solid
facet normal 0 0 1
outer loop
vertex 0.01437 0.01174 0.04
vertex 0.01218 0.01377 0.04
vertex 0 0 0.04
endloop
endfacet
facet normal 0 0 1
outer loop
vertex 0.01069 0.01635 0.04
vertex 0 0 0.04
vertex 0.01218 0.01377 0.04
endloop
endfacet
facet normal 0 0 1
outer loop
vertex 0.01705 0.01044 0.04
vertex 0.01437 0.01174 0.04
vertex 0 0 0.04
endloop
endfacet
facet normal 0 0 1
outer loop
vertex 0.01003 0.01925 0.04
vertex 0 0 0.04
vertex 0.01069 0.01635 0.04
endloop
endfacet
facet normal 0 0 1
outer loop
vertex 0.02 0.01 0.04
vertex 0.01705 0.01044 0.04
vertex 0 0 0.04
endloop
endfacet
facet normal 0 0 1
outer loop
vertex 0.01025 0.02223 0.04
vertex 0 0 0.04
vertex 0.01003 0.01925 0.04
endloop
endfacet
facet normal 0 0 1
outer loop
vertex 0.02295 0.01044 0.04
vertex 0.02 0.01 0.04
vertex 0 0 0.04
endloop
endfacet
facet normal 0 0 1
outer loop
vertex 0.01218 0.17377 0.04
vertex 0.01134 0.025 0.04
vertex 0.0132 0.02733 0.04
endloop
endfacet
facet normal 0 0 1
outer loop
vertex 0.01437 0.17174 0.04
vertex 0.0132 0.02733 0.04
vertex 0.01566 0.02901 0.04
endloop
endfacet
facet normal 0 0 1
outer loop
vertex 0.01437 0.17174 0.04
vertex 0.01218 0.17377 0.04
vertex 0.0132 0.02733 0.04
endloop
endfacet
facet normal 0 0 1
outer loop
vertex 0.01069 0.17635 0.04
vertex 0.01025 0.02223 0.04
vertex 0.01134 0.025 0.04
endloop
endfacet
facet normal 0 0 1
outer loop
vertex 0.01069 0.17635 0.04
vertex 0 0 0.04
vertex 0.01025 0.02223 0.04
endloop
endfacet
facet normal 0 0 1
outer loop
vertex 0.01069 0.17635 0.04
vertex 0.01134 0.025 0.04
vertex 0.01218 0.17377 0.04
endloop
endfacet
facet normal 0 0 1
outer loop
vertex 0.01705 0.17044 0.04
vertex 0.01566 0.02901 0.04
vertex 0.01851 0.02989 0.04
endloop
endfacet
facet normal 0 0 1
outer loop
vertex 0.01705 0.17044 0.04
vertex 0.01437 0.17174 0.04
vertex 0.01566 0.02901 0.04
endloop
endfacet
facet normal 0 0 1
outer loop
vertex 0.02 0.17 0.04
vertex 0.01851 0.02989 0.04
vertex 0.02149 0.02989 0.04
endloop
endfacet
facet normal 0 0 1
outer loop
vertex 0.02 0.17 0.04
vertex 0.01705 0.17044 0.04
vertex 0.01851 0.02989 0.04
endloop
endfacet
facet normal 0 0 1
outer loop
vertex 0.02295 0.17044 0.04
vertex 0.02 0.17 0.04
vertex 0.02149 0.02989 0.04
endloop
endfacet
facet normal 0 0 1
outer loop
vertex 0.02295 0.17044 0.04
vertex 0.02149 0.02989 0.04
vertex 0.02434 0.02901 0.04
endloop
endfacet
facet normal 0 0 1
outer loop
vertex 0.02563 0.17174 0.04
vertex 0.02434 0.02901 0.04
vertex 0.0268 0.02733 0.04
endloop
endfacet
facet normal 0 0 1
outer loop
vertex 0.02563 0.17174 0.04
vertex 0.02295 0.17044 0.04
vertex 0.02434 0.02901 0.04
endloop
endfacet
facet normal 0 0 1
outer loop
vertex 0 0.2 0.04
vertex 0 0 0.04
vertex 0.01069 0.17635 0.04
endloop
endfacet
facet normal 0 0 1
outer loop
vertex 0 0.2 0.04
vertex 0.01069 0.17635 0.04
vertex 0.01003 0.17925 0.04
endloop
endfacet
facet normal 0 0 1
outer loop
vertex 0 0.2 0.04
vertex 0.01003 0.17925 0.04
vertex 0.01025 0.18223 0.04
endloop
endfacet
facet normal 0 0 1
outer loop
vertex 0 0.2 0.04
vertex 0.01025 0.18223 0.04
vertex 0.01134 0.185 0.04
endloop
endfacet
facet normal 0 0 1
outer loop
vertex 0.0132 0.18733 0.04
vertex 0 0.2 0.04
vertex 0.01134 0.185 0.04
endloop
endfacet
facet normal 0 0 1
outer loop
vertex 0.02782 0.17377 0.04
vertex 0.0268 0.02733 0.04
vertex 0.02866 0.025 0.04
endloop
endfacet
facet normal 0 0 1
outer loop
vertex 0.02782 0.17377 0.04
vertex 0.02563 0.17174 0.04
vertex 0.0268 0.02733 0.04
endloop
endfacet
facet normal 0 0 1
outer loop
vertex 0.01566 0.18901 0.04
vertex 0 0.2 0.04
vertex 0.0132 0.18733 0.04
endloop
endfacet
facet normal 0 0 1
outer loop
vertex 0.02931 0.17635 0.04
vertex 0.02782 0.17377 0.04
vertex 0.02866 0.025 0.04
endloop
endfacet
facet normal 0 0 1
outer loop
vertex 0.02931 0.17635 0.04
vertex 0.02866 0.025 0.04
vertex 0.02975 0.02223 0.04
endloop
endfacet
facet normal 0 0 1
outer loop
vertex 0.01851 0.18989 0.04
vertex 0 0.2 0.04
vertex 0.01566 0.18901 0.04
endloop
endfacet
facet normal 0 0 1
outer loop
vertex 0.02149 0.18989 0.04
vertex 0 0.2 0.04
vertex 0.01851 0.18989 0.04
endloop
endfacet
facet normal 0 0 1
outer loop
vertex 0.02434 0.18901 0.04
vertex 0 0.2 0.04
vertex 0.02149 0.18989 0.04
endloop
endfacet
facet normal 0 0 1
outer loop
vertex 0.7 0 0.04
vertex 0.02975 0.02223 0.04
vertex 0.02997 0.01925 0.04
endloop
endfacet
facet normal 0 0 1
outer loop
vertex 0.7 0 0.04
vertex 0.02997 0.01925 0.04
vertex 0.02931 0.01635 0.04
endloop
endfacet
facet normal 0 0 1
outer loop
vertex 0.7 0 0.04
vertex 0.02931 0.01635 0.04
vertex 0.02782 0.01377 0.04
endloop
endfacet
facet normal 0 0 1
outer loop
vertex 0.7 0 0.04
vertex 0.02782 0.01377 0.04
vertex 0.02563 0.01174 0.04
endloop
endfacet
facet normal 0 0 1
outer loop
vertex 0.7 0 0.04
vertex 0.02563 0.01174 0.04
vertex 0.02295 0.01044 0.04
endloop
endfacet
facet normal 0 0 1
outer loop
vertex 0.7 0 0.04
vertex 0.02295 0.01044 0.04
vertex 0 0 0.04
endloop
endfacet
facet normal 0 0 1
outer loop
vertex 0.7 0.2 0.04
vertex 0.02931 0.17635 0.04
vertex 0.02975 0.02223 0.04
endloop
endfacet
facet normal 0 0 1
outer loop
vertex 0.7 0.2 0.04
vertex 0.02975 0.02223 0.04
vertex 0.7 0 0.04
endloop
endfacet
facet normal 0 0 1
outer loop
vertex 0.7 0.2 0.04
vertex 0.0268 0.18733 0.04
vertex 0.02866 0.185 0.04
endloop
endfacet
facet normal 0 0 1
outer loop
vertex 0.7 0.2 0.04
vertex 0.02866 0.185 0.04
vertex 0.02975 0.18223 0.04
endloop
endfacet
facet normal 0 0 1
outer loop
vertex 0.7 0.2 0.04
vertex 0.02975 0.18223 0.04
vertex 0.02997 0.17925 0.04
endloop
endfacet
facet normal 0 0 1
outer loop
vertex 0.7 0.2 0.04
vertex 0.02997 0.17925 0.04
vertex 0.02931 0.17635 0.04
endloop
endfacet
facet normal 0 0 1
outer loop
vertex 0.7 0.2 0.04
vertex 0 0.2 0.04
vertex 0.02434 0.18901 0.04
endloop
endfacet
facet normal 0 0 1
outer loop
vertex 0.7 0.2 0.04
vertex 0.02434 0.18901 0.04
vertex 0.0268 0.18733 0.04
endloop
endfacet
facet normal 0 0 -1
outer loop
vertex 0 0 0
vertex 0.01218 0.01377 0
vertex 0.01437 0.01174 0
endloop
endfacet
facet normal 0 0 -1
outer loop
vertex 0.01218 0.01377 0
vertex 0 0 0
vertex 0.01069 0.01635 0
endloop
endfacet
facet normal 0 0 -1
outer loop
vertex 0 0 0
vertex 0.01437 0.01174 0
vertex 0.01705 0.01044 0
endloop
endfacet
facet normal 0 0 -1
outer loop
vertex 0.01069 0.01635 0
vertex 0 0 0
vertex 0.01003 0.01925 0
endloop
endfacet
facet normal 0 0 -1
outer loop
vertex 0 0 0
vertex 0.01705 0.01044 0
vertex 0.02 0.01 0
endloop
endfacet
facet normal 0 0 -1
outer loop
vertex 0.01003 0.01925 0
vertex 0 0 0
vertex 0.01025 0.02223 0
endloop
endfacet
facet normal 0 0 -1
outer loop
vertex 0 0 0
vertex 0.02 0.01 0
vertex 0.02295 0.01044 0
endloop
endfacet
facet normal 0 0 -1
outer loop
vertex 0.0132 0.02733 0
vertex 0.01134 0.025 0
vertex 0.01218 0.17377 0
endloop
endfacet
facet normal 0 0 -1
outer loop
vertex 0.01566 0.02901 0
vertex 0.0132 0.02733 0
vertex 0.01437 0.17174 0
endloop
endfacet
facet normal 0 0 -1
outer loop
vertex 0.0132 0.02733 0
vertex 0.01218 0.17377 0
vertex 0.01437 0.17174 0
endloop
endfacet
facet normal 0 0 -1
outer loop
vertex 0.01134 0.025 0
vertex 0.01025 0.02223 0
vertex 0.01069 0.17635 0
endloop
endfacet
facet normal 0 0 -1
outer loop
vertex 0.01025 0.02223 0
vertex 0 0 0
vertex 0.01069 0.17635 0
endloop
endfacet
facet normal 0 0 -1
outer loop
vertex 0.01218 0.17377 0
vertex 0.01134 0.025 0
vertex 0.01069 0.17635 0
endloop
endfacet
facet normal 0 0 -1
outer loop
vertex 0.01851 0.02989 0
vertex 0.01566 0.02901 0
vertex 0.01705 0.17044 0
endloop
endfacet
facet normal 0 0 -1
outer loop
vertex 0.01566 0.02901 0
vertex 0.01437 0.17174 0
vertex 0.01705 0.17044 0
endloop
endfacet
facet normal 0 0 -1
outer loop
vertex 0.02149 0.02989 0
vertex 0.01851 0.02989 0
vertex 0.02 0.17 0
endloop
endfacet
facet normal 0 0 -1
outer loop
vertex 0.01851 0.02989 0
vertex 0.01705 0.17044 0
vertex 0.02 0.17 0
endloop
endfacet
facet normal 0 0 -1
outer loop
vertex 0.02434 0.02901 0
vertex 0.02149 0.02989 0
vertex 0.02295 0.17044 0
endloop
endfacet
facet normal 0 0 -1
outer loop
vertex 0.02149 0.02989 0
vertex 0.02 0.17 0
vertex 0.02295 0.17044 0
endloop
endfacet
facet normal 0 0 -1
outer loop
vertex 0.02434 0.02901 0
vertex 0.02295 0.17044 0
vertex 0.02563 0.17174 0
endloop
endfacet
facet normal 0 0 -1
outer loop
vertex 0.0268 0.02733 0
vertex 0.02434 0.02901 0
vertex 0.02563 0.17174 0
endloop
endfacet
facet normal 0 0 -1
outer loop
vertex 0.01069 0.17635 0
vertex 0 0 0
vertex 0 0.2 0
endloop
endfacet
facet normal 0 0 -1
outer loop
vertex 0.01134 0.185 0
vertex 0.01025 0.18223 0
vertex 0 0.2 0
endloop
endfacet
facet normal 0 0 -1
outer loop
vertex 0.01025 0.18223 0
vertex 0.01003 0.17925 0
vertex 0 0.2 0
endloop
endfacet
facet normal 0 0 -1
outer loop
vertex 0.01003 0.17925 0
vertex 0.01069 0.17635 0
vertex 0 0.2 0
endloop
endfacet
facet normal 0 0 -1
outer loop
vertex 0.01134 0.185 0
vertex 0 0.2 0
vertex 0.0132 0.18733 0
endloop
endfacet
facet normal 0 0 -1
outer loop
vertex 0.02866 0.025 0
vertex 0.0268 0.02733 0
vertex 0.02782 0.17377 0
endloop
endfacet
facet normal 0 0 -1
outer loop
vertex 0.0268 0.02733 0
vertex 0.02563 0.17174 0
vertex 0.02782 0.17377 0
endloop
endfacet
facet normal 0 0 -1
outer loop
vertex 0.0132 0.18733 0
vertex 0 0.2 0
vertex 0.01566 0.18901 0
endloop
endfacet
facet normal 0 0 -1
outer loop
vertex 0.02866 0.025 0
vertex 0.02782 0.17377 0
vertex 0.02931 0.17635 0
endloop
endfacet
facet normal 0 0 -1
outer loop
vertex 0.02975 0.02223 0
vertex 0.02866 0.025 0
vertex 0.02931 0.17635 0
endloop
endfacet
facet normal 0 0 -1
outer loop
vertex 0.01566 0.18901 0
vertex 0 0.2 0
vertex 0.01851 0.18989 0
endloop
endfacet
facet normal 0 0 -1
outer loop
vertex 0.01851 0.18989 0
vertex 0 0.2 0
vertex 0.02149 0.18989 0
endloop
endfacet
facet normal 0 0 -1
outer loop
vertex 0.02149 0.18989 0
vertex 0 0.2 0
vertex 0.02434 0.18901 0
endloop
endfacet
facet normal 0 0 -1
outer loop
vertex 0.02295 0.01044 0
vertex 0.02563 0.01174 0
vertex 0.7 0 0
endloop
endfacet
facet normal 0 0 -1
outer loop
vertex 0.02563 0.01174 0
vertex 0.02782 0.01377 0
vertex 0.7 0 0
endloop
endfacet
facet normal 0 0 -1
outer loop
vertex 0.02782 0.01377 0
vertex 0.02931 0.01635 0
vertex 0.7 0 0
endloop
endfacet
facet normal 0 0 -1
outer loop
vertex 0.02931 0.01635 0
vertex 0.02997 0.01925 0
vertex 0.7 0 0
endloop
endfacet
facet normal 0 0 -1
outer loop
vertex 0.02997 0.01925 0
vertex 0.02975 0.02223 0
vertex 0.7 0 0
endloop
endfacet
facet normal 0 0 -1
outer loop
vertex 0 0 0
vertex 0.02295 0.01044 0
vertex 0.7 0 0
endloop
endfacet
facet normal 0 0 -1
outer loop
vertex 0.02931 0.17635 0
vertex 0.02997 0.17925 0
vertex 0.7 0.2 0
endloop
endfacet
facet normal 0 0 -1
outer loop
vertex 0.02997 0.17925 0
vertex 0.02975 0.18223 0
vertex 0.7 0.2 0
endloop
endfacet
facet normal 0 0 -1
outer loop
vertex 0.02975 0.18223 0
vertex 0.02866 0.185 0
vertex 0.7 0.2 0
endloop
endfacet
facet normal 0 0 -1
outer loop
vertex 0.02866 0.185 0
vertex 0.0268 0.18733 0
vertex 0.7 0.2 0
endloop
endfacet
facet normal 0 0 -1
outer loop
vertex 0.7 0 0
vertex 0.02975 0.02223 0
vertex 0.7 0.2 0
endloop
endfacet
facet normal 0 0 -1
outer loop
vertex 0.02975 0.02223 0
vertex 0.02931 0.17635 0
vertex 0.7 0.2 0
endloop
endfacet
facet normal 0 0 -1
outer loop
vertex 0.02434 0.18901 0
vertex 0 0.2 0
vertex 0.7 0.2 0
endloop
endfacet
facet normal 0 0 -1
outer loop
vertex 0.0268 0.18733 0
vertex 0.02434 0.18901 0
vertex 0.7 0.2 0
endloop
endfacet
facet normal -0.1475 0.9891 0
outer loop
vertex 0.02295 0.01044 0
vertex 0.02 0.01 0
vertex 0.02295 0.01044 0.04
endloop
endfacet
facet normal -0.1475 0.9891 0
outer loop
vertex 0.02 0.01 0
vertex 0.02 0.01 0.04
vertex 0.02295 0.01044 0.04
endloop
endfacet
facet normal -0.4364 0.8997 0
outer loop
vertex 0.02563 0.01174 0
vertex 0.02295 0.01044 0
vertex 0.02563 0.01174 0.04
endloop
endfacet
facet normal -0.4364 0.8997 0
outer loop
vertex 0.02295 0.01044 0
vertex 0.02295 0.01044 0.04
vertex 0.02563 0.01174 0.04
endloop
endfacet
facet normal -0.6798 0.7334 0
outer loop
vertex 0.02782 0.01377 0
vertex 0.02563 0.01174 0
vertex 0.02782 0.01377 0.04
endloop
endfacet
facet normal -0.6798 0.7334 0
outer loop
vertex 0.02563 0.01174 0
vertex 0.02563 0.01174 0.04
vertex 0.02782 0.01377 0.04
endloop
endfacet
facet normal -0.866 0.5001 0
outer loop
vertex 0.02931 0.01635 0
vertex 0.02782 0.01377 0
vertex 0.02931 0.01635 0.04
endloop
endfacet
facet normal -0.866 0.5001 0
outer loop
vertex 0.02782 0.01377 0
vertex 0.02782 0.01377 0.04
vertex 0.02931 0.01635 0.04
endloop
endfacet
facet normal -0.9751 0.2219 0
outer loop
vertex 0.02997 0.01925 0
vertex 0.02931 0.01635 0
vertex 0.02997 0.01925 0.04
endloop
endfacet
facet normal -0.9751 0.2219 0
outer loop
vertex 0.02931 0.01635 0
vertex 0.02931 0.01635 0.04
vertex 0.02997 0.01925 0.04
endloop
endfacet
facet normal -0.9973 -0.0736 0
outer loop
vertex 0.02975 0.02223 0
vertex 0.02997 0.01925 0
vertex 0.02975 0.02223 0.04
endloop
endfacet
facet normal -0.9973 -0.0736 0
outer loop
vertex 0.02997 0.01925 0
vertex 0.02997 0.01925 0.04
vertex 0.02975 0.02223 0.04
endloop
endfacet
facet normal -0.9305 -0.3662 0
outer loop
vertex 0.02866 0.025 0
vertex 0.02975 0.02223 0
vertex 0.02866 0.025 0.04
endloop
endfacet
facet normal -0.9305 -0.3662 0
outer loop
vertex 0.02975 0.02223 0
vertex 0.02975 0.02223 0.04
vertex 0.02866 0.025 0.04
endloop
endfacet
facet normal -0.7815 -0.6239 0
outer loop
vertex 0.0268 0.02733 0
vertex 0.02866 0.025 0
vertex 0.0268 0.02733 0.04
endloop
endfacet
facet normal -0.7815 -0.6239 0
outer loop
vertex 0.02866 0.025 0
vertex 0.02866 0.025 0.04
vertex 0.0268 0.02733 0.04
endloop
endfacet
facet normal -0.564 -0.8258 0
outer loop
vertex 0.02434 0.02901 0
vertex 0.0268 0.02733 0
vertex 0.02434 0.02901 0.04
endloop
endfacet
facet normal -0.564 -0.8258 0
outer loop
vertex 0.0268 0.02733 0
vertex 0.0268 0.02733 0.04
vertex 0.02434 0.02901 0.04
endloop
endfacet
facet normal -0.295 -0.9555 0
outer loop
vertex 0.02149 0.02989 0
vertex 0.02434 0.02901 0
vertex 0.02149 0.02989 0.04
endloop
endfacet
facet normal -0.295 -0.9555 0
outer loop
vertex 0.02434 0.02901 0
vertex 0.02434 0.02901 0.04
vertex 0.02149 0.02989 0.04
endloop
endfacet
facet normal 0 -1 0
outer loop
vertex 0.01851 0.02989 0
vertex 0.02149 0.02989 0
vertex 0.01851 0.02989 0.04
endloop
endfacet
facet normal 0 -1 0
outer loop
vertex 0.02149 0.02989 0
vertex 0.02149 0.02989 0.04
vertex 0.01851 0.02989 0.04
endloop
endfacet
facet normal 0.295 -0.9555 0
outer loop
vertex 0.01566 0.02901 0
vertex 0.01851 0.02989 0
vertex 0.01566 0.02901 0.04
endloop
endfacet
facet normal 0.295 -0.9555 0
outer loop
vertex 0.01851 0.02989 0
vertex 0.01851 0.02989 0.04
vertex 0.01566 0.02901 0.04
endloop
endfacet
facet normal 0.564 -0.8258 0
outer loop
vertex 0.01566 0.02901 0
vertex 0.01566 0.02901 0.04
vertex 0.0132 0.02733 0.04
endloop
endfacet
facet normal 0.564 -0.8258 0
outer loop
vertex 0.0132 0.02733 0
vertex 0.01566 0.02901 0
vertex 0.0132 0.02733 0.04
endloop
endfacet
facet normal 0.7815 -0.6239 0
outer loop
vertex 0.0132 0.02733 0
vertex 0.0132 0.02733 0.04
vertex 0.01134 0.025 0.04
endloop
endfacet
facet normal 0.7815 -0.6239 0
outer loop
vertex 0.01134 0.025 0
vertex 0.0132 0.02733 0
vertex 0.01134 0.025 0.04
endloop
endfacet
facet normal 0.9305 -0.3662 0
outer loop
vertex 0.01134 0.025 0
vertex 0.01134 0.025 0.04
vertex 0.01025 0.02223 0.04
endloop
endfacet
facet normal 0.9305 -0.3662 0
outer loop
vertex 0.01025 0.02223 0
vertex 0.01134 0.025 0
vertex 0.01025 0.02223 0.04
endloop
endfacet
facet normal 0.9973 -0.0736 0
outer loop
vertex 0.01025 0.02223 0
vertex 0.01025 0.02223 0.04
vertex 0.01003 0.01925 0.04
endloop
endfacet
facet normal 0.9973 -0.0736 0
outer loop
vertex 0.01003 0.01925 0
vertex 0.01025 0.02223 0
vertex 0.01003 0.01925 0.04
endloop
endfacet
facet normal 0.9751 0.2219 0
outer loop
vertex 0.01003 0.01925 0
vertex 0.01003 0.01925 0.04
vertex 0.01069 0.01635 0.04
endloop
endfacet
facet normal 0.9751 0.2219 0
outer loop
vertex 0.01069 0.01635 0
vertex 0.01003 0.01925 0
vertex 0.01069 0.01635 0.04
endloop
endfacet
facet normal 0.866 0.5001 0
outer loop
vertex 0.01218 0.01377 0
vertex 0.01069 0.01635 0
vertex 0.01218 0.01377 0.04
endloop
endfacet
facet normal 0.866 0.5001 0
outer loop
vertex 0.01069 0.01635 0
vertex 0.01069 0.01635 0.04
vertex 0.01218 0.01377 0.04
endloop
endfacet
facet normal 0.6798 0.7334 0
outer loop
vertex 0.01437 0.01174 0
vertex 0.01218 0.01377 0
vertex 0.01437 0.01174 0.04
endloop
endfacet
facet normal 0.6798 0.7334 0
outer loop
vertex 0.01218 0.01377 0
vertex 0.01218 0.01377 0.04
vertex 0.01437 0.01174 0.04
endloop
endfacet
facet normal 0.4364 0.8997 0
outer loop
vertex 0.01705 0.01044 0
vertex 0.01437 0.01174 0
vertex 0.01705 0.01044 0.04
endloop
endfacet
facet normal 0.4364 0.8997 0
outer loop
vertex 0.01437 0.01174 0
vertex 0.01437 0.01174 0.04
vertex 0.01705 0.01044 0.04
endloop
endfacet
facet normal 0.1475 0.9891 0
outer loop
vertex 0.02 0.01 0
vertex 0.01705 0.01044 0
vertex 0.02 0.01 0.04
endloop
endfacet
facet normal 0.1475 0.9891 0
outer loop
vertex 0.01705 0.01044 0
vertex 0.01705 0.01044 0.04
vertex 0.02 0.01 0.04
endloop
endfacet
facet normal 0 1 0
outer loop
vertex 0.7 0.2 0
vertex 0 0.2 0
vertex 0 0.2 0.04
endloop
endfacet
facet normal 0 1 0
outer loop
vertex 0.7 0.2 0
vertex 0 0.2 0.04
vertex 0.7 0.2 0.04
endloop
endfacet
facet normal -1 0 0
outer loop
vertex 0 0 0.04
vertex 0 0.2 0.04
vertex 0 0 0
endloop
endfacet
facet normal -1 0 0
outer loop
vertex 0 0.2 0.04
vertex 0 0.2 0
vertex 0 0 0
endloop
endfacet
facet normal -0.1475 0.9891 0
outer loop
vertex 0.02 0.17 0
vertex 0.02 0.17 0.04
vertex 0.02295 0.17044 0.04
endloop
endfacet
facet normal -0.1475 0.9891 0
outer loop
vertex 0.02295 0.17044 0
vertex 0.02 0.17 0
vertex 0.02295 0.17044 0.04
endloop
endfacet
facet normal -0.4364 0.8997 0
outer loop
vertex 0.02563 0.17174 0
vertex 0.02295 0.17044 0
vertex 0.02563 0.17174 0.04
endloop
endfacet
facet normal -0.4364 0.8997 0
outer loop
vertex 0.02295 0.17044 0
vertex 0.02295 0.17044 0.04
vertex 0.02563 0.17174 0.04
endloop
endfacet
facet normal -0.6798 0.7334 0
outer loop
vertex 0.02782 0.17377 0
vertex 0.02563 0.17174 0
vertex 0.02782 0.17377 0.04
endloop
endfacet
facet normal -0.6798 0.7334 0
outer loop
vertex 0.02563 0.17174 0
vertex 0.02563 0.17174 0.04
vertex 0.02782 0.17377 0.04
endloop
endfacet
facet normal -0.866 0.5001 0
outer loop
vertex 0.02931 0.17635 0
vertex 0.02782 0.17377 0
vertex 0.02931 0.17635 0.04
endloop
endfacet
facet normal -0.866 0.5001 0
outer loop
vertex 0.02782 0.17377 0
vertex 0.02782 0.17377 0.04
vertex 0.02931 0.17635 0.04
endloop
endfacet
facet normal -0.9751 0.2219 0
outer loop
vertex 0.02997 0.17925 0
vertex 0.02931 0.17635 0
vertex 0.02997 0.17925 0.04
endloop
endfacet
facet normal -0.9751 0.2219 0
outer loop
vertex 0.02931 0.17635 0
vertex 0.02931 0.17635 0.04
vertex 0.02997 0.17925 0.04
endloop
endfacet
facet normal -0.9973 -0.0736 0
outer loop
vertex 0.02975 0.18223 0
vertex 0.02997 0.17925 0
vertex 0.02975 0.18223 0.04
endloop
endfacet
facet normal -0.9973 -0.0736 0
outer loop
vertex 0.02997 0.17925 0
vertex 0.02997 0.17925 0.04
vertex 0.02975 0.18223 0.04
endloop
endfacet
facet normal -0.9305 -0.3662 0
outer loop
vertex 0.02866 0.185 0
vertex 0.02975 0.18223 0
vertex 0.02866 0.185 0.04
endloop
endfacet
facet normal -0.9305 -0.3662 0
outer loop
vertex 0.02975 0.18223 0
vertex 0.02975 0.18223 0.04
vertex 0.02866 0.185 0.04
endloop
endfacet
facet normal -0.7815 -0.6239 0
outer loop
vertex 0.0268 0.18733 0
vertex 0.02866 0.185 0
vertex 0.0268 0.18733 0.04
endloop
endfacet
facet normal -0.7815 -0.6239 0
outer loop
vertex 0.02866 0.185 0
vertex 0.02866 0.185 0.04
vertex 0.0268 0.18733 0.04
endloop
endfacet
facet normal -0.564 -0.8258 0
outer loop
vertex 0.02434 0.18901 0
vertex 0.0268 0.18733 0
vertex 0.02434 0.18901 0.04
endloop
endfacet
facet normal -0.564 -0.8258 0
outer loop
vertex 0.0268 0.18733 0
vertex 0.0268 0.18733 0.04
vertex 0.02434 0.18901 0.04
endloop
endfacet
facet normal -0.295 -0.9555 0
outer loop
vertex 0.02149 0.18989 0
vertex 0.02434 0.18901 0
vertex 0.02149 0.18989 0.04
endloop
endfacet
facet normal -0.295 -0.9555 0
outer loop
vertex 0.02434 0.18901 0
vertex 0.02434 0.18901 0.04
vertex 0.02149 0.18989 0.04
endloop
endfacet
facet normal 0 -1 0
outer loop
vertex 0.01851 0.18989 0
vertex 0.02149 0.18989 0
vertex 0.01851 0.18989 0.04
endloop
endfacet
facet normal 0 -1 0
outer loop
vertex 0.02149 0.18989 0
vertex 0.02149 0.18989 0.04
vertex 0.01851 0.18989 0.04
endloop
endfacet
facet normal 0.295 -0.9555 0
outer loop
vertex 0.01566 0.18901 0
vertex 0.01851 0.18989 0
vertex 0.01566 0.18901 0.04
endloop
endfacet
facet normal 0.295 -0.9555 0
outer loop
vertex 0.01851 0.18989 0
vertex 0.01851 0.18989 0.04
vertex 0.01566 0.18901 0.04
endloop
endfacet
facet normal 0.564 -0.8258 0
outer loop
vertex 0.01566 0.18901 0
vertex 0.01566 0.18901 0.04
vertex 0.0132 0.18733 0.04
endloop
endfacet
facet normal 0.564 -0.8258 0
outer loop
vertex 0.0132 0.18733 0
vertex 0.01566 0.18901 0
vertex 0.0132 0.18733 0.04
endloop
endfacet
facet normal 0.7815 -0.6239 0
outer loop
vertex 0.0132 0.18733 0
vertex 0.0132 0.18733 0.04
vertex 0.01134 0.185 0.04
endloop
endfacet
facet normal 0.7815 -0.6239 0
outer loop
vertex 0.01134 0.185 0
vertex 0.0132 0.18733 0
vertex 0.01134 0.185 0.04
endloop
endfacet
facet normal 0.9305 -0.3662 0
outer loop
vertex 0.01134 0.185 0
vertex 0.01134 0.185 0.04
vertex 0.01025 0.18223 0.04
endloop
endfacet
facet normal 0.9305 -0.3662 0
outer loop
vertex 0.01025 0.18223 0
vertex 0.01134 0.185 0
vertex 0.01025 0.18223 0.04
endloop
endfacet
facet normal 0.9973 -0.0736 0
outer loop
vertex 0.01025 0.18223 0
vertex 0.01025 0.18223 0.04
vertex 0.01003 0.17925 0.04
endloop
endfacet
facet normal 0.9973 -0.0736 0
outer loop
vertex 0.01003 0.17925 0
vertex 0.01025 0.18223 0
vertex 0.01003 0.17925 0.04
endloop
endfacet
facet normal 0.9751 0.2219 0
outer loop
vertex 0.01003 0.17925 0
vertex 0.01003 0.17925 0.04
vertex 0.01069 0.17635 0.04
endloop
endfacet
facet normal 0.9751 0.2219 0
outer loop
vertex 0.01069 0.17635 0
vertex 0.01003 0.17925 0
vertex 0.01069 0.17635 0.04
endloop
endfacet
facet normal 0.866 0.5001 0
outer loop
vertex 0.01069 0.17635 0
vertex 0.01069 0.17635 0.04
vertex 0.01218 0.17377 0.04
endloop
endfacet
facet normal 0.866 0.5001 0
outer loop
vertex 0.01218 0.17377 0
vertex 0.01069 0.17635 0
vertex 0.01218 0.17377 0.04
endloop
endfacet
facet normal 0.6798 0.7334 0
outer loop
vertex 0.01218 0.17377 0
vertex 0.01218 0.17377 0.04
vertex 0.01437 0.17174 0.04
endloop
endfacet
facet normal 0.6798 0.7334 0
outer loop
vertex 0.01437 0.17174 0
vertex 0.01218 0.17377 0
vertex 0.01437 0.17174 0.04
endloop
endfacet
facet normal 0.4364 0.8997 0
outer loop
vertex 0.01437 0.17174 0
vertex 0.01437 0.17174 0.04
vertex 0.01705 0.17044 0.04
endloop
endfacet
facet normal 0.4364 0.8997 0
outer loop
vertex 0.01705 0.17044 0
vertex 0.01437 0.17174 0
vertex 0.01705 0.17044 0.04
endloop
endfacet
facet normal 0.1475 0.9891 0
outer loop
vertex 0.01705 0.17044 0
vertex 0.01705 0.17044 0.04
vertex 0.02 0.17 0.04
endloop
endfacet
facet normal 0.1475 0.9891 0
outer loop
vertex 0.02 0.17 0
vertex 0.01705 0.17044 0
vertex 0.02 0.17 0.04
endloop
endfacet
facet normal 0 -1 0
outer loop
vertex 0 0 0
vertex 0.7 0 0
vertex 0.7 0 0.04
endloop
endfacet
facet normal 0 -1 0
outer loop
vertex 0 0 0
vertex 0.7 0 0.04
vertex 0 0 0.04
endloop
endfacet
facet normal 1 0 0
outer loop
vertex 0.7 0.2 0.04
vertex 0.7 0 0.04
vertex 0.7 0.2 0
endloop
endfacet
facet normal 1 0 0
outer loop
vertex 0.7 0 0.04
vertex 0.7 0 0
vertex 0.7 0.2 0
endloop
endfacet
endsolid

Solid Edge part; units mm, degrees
sketch "Sketch1" plane through (0, 0, 0) normal (0, 0, 1) x (1, 0, 0)
  line L0 (0.7, 0) -> (0.7, 0.2)
  line L1 (0, 0.2) -> (0.7, 0.2)
  line L2 (0, 0.2) -> (0, 0)
  line L3 (0.7, 0) -> (0, 0)
  dimension "D1" = 0.2
extrude "Protrusion1" add sketch "Sketch1" along normal blind 0.04
hole "Bohrung_1" at (0.02, 0.02, 0.04) direction (0, 0, -1) diameter 0.02 end through all
hole "Hole1" at (0.02, 0.18, 0.04) direction (0, 0, -1) diameter 0.02 end through all
